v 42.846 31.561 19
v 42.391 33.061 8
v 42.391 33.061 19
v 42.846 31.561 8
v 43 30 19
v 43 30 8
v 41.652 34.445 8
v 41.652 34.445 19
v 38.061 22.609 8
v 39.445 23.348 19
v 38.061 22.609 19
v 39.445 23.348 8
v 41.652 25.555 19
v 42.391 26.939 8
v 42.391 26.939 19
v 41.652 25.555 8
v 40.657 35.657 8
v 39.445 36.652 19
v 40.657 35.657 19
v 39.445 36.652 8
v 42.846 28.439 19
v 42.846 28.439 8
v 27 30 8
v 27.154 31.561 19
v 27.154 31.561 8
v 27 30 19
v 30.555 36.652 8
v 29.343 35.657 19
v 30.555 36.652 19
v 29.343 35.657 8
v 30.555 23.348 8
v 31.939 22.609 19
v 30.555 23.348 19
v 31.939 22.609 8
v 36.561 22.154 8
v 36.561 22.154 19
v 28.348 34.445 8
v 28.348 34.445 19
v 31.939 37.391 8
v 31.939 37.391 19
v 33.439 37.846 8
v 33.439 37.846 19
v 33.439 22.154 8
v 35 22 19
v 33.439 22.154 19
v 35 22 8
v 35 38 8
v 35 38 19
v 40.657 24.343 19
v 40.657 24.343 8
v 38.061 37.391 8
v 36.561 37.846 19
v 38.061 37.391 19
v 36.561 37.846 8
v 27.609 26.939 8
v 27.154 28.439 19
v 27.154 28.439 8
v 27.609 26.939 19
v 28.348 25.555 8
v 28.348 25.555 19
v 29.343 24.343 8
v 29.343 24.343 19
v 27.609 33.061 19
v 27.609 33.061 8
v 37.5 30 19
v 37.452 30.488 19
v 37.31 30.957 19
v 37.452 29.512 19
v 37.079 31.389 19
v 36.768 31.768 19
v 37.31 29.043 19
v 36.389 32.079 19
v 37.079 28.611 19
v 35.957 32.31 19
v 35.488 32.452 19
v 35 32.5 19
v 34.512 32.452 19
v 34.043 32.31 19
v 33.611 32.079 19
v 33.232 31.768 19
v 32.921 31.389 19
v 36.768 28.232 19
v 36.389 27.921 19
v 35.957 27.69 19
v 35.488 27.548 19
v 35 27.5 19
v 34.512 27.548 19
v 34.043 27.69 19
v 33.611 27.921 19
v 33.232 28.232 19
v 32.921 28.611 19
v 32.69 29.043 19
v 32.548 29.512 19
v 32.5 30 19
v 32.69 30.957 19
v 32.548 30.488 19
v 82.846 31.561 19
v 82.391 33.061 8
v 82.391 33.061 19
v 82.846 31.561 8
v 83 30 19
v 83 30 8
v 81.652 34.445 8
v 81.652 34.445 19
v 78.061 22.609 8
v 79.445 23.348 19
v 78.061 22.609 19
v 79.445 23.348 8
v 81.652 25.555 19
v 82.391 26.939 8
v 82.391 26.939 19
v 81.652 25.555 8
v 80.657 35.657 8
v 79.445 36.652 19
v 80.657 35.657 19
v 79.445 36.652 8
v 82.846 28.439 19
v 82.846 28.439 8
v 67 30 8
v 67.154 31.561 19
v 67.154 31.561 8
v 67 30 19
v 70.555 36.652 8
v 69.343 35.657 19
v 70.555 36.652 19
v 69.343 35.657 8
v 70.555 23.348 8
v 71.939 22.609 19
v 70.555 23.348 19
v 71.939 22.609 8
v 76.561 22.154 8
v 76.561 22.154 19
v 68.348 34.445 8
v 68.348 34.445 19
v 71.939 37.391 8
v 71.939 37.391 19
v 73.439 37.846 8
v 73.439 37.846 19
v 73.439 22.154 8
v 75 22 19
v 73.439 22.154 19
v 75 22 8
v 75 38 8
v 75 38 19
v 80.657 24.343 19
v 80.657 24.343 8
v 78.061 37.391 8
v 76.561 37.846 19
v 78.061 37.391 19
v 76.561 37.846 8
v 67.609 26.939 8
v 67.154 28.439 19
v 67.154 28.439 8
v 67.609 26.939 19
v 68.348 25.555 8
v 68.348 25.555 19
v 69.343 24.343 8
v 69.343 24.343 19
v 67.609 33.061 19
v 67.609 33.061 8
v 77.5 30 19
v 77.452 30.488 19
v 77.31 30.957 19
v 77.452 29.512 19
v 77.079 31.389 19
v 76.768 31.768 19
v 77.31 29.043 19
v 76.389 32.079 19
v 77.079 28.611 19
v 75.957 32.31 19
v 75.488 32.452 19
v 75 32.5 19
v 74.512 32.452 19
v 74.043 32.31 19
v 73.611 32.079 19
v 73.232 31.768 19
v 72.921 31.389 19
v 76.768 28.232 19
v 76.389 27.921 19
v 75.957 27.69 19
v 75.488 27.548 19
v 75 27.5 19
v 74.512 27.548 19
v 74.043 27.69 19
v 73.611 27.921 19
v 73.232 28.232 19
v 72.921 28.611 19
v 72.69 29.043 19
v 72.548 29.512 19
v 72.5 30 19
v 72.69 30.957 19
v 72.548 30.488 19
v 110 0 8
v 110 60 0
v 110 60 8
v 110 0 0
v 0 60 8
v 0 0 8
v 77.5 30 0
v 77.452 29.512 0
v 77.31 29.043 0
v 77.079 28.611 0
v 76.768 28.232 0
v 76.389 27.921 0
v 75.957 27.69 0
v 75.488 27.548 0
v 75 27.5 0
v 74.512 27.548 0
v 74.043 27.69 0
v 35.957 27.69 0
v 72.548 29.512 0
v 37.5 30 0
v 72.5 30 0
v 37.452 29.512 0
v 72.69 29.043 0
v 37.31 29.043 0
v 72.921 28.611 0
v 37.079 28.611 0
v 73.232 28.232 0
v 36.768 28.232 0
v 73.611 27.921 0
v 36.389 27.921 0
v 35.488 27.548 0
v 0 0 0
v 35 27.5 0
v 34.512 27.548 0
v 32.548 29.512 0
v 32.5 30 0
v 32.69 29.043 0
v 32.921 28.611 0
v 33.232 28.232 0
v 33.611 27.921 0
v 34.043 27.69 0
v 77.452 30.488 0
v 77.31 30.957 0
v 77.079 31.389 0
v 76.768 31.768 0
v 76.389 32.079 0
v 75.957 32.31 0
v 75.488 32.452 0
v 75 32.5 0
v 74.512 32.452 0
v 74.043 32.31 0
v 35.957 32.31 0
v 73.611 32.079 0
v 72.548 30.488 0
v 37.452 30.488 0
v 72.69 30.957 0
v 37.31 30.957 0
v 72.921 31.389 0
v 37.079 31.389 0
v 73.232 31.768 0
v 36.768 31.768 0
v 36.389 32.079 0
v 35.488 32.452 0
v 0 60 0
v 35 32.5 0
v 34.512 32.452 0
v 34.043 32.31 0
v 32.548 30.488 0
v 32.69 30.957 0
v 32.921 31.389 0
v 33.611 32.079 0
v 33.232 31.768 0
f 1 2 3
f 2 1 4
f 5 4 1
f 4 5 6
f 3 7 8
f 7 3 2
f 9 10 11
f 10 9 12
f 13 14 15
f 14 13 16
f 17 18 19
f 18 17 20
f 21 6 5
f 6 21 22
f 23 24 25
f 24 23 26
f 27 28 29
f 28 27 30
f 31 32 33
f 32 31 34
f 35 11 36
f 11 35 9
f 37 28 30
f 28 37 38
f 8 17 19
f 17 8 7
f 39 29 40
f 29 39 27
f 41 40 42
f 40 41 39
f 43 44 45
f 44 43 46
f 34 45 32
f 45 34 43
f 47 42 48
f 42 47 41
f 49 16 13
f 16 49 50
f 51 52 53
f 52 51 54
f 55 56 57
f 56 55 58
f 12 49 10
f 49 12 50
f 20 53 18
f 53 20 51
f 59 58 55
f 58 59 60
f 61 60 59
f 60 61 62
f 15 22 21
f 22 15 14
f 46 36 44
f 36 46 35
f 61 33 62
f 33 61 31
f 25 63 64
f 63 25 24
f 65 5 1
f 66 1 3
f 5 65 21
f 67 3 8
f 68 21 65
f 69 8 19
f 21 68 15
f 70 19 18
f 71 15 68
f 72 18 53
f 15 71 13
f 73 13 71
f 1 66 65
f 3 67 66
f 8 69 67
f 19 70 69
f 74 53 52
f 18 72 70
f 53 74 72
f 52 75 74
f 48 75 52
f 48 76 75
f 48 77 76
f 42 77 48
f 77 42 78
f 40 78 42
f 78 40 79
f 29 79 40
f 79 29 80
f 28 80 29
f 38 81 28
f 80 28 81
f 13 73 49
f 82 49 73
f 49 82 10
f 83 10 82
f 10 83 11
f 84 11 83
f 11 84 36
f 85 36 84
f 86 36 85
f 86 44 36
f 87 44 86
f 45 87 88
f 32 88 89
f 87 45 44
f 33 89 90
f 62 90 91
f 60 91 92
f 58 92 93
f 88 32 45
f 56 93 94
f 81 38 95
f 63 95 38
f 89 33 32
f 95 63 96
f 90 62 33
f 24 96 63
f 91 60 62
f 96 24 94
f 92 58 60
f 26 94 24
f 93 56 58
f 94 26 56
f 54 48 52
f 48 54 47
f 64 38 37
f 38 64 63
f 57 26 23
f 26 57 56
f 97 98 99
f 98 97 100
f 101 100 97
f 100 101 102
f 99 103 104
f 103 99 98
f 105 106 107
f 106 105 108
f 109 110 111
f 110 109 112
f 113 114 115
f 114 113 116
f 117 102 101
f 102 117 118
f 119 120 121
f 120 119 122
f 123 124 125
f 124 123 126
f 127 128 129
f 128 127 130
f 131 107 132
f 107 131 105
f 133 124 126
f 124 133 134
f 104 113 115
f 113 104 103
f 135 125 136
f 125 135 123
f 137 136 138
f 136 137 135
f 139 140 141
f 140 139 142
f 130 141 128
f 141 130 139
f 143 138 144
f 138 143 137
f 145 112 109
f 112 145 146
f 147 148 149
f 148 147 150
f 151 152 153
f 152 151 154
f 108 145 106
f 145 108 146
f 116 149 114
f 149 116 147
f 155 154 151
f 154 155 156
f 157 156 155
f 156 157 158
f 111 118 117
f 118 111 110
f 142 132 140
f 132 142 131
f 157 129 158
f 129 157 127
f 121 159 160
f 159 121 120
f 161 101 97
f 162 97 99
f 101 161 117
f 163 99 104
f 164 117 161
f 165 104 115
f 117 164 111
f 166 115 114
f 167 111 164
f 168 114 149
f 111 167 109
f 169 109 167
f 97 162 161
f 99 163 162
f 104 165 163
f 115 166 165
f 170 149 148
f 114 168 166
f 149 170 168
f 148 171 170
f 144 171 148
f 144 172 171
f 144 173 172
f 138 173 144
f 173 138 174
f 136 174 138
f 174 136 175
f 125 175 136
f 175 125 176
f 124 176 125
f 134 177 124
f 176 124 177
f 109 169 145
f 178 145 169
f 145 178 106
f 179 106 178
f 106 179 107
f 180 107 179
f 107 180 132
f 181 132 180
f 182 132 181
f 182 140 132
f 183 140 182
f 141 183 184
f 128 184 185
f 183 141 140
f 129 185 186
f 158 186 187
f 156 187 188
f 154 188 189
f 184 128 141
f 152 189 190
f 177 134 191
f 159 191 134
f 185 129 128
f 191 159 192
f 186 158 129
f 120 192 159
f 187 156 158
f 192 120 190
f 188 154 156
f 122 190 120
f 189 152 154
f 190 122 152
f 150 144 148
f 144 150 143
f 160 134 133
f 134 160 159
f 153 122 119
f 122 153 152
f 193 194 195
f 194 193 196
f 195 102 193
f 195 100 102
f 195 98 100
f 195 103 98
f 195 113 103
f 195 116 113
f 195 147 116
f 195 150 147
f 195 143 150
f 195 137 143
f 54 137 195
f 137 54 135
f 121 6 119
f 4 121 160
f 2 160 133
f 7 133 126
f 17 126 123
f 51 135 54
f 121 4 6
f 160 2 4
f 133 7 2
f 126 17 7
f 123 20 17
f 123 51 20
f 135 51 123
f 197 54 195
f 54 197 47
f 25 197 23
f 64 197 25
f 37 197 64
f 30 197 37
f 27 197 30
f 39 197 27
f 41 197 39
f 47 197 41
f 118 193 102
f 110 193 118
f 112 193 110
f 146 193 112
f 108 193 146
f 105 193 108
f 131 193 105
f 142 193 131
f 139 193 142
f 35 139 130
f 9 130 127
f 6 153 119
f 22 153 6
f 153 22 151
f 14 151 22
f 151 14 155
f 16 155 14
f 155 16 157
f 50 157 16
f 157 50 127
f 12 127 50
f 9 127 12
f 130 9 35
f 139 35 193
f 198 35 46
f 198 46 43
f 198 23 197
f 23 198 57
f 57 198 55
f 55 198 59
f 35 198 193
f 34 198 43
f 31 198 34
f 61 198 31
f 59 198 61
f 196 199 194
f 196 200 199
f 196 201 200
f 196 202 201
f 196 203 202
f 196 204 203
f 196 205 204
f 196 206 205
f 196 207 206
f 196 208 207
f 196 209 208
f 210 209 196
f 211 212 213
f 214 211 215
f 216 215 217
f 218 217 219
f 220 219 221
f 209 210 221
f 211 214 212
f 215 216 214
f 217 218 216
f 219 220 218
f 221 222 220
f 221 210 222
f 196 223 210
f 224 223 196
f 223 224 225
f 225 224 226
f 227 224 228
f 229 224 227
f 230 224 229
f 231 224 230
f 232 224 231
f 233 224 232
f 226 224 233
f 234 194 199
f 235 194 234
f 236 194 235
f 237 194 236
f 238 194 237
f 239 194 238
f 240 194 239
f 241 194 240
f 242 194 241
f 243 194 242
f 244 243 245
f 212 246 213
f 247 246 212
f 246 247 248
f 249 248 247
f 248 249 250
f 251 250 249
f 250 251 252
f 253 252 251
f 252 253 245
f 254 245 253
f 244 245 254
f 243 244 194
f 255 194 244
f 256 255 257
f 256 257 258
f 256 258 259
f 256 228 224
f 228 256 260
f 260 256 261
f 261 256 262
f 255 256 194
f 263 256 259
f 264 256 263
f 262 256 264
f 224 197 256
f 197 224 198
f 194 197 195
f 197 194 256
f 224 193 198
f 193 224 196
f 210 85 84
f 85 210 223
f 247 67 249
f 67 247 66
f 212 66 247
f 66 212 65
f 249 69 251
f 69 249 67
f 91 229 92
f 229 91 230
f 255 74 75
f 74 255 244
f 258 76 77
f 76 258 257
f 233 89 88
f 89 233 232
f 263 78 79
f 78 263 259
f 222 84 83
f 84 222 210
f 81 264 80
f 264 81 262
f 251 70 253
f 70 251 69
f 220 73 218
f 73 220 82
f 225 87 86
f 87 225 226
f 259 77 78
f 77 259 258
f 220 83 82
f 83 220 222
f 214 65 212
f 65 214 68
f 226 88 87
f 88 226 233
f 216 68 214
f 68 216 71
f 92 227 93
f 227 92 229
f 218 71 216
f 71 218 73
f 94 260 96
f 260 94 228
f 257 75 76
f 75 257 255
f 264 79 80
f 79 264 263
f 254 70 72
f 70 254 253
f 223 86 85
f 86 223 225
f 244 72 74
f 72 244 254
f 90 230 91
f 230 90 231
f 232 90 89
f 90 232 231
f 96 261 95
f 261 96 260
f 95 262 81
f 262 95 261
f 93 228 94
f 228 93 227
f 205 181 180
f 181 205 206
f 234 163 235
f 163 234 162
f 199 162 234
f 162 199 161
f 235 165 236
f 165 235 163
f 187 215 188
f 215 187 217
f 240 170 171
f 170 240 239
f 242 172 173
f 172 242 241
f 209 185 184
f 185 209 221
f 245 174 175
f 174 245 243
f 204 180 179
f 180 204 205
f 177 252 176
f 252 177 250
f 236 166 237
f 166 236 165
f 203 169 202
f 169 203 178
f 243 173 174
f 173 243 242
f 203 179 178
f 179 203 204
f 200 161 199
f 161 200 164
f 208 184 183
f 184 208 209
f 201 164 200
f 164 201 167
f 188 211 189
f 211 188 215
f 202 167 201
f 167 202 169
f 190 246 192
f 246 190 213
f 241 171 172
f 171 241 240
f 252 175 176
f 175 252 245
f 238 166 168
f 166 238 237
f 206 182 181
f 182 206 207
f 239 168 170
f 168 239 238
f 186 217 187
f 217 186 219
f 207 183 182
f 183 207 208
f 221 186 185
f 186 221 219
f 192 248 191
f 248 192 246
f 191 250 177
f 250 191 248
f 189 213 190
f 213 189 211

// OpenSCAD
$fn = 32;

// ----------------------------------------------------------------------
// Drill jig: two_boss jig
// ----------------------------------------------------------------------

// --- parameters (mm) ---
plate_l = 110;            // plate length, X
plate_w = 60;             // plate width, Y
plate_t = 8;              // plate thickness
boss_d = 16;              // guide boss diameter
boss_h = 12;              // boss height above the plate
guide_d = 5;              // guide hole diameter
boss_pitch = 40;          // boss pitch
fit_tol = 0.02;           // tolerance for press fits, mm
free_tol = 0.2;           // tolerance for clearance fits, mm

n_boss = 2;  // guide bosses
boss_x0 = (plate_l - (n_boss - 1) * boss_pitch) / 2;  // first boss X
boss_top = plate_t - 1 + boss_h;  // boss crown height
total_h = boss_top;  // overall height

difference() {
  union() {
  cube([plate_l, plate_w, plate_t]);
  for (i = [0 : n_boss - 1])
    translate([boss_x0 + i * boss_pitch, plate_w / 2, plate_t - 1])
      cylinder(h = boss_h, d = boss_d);
  }
  for (i = [0 : n_boss - 1])
    translate([boss_x0 + i * boss_pitch, plate_w / 2, -1])
      cylinder(h = plate_t + boss_h, d = guide_d);
}
